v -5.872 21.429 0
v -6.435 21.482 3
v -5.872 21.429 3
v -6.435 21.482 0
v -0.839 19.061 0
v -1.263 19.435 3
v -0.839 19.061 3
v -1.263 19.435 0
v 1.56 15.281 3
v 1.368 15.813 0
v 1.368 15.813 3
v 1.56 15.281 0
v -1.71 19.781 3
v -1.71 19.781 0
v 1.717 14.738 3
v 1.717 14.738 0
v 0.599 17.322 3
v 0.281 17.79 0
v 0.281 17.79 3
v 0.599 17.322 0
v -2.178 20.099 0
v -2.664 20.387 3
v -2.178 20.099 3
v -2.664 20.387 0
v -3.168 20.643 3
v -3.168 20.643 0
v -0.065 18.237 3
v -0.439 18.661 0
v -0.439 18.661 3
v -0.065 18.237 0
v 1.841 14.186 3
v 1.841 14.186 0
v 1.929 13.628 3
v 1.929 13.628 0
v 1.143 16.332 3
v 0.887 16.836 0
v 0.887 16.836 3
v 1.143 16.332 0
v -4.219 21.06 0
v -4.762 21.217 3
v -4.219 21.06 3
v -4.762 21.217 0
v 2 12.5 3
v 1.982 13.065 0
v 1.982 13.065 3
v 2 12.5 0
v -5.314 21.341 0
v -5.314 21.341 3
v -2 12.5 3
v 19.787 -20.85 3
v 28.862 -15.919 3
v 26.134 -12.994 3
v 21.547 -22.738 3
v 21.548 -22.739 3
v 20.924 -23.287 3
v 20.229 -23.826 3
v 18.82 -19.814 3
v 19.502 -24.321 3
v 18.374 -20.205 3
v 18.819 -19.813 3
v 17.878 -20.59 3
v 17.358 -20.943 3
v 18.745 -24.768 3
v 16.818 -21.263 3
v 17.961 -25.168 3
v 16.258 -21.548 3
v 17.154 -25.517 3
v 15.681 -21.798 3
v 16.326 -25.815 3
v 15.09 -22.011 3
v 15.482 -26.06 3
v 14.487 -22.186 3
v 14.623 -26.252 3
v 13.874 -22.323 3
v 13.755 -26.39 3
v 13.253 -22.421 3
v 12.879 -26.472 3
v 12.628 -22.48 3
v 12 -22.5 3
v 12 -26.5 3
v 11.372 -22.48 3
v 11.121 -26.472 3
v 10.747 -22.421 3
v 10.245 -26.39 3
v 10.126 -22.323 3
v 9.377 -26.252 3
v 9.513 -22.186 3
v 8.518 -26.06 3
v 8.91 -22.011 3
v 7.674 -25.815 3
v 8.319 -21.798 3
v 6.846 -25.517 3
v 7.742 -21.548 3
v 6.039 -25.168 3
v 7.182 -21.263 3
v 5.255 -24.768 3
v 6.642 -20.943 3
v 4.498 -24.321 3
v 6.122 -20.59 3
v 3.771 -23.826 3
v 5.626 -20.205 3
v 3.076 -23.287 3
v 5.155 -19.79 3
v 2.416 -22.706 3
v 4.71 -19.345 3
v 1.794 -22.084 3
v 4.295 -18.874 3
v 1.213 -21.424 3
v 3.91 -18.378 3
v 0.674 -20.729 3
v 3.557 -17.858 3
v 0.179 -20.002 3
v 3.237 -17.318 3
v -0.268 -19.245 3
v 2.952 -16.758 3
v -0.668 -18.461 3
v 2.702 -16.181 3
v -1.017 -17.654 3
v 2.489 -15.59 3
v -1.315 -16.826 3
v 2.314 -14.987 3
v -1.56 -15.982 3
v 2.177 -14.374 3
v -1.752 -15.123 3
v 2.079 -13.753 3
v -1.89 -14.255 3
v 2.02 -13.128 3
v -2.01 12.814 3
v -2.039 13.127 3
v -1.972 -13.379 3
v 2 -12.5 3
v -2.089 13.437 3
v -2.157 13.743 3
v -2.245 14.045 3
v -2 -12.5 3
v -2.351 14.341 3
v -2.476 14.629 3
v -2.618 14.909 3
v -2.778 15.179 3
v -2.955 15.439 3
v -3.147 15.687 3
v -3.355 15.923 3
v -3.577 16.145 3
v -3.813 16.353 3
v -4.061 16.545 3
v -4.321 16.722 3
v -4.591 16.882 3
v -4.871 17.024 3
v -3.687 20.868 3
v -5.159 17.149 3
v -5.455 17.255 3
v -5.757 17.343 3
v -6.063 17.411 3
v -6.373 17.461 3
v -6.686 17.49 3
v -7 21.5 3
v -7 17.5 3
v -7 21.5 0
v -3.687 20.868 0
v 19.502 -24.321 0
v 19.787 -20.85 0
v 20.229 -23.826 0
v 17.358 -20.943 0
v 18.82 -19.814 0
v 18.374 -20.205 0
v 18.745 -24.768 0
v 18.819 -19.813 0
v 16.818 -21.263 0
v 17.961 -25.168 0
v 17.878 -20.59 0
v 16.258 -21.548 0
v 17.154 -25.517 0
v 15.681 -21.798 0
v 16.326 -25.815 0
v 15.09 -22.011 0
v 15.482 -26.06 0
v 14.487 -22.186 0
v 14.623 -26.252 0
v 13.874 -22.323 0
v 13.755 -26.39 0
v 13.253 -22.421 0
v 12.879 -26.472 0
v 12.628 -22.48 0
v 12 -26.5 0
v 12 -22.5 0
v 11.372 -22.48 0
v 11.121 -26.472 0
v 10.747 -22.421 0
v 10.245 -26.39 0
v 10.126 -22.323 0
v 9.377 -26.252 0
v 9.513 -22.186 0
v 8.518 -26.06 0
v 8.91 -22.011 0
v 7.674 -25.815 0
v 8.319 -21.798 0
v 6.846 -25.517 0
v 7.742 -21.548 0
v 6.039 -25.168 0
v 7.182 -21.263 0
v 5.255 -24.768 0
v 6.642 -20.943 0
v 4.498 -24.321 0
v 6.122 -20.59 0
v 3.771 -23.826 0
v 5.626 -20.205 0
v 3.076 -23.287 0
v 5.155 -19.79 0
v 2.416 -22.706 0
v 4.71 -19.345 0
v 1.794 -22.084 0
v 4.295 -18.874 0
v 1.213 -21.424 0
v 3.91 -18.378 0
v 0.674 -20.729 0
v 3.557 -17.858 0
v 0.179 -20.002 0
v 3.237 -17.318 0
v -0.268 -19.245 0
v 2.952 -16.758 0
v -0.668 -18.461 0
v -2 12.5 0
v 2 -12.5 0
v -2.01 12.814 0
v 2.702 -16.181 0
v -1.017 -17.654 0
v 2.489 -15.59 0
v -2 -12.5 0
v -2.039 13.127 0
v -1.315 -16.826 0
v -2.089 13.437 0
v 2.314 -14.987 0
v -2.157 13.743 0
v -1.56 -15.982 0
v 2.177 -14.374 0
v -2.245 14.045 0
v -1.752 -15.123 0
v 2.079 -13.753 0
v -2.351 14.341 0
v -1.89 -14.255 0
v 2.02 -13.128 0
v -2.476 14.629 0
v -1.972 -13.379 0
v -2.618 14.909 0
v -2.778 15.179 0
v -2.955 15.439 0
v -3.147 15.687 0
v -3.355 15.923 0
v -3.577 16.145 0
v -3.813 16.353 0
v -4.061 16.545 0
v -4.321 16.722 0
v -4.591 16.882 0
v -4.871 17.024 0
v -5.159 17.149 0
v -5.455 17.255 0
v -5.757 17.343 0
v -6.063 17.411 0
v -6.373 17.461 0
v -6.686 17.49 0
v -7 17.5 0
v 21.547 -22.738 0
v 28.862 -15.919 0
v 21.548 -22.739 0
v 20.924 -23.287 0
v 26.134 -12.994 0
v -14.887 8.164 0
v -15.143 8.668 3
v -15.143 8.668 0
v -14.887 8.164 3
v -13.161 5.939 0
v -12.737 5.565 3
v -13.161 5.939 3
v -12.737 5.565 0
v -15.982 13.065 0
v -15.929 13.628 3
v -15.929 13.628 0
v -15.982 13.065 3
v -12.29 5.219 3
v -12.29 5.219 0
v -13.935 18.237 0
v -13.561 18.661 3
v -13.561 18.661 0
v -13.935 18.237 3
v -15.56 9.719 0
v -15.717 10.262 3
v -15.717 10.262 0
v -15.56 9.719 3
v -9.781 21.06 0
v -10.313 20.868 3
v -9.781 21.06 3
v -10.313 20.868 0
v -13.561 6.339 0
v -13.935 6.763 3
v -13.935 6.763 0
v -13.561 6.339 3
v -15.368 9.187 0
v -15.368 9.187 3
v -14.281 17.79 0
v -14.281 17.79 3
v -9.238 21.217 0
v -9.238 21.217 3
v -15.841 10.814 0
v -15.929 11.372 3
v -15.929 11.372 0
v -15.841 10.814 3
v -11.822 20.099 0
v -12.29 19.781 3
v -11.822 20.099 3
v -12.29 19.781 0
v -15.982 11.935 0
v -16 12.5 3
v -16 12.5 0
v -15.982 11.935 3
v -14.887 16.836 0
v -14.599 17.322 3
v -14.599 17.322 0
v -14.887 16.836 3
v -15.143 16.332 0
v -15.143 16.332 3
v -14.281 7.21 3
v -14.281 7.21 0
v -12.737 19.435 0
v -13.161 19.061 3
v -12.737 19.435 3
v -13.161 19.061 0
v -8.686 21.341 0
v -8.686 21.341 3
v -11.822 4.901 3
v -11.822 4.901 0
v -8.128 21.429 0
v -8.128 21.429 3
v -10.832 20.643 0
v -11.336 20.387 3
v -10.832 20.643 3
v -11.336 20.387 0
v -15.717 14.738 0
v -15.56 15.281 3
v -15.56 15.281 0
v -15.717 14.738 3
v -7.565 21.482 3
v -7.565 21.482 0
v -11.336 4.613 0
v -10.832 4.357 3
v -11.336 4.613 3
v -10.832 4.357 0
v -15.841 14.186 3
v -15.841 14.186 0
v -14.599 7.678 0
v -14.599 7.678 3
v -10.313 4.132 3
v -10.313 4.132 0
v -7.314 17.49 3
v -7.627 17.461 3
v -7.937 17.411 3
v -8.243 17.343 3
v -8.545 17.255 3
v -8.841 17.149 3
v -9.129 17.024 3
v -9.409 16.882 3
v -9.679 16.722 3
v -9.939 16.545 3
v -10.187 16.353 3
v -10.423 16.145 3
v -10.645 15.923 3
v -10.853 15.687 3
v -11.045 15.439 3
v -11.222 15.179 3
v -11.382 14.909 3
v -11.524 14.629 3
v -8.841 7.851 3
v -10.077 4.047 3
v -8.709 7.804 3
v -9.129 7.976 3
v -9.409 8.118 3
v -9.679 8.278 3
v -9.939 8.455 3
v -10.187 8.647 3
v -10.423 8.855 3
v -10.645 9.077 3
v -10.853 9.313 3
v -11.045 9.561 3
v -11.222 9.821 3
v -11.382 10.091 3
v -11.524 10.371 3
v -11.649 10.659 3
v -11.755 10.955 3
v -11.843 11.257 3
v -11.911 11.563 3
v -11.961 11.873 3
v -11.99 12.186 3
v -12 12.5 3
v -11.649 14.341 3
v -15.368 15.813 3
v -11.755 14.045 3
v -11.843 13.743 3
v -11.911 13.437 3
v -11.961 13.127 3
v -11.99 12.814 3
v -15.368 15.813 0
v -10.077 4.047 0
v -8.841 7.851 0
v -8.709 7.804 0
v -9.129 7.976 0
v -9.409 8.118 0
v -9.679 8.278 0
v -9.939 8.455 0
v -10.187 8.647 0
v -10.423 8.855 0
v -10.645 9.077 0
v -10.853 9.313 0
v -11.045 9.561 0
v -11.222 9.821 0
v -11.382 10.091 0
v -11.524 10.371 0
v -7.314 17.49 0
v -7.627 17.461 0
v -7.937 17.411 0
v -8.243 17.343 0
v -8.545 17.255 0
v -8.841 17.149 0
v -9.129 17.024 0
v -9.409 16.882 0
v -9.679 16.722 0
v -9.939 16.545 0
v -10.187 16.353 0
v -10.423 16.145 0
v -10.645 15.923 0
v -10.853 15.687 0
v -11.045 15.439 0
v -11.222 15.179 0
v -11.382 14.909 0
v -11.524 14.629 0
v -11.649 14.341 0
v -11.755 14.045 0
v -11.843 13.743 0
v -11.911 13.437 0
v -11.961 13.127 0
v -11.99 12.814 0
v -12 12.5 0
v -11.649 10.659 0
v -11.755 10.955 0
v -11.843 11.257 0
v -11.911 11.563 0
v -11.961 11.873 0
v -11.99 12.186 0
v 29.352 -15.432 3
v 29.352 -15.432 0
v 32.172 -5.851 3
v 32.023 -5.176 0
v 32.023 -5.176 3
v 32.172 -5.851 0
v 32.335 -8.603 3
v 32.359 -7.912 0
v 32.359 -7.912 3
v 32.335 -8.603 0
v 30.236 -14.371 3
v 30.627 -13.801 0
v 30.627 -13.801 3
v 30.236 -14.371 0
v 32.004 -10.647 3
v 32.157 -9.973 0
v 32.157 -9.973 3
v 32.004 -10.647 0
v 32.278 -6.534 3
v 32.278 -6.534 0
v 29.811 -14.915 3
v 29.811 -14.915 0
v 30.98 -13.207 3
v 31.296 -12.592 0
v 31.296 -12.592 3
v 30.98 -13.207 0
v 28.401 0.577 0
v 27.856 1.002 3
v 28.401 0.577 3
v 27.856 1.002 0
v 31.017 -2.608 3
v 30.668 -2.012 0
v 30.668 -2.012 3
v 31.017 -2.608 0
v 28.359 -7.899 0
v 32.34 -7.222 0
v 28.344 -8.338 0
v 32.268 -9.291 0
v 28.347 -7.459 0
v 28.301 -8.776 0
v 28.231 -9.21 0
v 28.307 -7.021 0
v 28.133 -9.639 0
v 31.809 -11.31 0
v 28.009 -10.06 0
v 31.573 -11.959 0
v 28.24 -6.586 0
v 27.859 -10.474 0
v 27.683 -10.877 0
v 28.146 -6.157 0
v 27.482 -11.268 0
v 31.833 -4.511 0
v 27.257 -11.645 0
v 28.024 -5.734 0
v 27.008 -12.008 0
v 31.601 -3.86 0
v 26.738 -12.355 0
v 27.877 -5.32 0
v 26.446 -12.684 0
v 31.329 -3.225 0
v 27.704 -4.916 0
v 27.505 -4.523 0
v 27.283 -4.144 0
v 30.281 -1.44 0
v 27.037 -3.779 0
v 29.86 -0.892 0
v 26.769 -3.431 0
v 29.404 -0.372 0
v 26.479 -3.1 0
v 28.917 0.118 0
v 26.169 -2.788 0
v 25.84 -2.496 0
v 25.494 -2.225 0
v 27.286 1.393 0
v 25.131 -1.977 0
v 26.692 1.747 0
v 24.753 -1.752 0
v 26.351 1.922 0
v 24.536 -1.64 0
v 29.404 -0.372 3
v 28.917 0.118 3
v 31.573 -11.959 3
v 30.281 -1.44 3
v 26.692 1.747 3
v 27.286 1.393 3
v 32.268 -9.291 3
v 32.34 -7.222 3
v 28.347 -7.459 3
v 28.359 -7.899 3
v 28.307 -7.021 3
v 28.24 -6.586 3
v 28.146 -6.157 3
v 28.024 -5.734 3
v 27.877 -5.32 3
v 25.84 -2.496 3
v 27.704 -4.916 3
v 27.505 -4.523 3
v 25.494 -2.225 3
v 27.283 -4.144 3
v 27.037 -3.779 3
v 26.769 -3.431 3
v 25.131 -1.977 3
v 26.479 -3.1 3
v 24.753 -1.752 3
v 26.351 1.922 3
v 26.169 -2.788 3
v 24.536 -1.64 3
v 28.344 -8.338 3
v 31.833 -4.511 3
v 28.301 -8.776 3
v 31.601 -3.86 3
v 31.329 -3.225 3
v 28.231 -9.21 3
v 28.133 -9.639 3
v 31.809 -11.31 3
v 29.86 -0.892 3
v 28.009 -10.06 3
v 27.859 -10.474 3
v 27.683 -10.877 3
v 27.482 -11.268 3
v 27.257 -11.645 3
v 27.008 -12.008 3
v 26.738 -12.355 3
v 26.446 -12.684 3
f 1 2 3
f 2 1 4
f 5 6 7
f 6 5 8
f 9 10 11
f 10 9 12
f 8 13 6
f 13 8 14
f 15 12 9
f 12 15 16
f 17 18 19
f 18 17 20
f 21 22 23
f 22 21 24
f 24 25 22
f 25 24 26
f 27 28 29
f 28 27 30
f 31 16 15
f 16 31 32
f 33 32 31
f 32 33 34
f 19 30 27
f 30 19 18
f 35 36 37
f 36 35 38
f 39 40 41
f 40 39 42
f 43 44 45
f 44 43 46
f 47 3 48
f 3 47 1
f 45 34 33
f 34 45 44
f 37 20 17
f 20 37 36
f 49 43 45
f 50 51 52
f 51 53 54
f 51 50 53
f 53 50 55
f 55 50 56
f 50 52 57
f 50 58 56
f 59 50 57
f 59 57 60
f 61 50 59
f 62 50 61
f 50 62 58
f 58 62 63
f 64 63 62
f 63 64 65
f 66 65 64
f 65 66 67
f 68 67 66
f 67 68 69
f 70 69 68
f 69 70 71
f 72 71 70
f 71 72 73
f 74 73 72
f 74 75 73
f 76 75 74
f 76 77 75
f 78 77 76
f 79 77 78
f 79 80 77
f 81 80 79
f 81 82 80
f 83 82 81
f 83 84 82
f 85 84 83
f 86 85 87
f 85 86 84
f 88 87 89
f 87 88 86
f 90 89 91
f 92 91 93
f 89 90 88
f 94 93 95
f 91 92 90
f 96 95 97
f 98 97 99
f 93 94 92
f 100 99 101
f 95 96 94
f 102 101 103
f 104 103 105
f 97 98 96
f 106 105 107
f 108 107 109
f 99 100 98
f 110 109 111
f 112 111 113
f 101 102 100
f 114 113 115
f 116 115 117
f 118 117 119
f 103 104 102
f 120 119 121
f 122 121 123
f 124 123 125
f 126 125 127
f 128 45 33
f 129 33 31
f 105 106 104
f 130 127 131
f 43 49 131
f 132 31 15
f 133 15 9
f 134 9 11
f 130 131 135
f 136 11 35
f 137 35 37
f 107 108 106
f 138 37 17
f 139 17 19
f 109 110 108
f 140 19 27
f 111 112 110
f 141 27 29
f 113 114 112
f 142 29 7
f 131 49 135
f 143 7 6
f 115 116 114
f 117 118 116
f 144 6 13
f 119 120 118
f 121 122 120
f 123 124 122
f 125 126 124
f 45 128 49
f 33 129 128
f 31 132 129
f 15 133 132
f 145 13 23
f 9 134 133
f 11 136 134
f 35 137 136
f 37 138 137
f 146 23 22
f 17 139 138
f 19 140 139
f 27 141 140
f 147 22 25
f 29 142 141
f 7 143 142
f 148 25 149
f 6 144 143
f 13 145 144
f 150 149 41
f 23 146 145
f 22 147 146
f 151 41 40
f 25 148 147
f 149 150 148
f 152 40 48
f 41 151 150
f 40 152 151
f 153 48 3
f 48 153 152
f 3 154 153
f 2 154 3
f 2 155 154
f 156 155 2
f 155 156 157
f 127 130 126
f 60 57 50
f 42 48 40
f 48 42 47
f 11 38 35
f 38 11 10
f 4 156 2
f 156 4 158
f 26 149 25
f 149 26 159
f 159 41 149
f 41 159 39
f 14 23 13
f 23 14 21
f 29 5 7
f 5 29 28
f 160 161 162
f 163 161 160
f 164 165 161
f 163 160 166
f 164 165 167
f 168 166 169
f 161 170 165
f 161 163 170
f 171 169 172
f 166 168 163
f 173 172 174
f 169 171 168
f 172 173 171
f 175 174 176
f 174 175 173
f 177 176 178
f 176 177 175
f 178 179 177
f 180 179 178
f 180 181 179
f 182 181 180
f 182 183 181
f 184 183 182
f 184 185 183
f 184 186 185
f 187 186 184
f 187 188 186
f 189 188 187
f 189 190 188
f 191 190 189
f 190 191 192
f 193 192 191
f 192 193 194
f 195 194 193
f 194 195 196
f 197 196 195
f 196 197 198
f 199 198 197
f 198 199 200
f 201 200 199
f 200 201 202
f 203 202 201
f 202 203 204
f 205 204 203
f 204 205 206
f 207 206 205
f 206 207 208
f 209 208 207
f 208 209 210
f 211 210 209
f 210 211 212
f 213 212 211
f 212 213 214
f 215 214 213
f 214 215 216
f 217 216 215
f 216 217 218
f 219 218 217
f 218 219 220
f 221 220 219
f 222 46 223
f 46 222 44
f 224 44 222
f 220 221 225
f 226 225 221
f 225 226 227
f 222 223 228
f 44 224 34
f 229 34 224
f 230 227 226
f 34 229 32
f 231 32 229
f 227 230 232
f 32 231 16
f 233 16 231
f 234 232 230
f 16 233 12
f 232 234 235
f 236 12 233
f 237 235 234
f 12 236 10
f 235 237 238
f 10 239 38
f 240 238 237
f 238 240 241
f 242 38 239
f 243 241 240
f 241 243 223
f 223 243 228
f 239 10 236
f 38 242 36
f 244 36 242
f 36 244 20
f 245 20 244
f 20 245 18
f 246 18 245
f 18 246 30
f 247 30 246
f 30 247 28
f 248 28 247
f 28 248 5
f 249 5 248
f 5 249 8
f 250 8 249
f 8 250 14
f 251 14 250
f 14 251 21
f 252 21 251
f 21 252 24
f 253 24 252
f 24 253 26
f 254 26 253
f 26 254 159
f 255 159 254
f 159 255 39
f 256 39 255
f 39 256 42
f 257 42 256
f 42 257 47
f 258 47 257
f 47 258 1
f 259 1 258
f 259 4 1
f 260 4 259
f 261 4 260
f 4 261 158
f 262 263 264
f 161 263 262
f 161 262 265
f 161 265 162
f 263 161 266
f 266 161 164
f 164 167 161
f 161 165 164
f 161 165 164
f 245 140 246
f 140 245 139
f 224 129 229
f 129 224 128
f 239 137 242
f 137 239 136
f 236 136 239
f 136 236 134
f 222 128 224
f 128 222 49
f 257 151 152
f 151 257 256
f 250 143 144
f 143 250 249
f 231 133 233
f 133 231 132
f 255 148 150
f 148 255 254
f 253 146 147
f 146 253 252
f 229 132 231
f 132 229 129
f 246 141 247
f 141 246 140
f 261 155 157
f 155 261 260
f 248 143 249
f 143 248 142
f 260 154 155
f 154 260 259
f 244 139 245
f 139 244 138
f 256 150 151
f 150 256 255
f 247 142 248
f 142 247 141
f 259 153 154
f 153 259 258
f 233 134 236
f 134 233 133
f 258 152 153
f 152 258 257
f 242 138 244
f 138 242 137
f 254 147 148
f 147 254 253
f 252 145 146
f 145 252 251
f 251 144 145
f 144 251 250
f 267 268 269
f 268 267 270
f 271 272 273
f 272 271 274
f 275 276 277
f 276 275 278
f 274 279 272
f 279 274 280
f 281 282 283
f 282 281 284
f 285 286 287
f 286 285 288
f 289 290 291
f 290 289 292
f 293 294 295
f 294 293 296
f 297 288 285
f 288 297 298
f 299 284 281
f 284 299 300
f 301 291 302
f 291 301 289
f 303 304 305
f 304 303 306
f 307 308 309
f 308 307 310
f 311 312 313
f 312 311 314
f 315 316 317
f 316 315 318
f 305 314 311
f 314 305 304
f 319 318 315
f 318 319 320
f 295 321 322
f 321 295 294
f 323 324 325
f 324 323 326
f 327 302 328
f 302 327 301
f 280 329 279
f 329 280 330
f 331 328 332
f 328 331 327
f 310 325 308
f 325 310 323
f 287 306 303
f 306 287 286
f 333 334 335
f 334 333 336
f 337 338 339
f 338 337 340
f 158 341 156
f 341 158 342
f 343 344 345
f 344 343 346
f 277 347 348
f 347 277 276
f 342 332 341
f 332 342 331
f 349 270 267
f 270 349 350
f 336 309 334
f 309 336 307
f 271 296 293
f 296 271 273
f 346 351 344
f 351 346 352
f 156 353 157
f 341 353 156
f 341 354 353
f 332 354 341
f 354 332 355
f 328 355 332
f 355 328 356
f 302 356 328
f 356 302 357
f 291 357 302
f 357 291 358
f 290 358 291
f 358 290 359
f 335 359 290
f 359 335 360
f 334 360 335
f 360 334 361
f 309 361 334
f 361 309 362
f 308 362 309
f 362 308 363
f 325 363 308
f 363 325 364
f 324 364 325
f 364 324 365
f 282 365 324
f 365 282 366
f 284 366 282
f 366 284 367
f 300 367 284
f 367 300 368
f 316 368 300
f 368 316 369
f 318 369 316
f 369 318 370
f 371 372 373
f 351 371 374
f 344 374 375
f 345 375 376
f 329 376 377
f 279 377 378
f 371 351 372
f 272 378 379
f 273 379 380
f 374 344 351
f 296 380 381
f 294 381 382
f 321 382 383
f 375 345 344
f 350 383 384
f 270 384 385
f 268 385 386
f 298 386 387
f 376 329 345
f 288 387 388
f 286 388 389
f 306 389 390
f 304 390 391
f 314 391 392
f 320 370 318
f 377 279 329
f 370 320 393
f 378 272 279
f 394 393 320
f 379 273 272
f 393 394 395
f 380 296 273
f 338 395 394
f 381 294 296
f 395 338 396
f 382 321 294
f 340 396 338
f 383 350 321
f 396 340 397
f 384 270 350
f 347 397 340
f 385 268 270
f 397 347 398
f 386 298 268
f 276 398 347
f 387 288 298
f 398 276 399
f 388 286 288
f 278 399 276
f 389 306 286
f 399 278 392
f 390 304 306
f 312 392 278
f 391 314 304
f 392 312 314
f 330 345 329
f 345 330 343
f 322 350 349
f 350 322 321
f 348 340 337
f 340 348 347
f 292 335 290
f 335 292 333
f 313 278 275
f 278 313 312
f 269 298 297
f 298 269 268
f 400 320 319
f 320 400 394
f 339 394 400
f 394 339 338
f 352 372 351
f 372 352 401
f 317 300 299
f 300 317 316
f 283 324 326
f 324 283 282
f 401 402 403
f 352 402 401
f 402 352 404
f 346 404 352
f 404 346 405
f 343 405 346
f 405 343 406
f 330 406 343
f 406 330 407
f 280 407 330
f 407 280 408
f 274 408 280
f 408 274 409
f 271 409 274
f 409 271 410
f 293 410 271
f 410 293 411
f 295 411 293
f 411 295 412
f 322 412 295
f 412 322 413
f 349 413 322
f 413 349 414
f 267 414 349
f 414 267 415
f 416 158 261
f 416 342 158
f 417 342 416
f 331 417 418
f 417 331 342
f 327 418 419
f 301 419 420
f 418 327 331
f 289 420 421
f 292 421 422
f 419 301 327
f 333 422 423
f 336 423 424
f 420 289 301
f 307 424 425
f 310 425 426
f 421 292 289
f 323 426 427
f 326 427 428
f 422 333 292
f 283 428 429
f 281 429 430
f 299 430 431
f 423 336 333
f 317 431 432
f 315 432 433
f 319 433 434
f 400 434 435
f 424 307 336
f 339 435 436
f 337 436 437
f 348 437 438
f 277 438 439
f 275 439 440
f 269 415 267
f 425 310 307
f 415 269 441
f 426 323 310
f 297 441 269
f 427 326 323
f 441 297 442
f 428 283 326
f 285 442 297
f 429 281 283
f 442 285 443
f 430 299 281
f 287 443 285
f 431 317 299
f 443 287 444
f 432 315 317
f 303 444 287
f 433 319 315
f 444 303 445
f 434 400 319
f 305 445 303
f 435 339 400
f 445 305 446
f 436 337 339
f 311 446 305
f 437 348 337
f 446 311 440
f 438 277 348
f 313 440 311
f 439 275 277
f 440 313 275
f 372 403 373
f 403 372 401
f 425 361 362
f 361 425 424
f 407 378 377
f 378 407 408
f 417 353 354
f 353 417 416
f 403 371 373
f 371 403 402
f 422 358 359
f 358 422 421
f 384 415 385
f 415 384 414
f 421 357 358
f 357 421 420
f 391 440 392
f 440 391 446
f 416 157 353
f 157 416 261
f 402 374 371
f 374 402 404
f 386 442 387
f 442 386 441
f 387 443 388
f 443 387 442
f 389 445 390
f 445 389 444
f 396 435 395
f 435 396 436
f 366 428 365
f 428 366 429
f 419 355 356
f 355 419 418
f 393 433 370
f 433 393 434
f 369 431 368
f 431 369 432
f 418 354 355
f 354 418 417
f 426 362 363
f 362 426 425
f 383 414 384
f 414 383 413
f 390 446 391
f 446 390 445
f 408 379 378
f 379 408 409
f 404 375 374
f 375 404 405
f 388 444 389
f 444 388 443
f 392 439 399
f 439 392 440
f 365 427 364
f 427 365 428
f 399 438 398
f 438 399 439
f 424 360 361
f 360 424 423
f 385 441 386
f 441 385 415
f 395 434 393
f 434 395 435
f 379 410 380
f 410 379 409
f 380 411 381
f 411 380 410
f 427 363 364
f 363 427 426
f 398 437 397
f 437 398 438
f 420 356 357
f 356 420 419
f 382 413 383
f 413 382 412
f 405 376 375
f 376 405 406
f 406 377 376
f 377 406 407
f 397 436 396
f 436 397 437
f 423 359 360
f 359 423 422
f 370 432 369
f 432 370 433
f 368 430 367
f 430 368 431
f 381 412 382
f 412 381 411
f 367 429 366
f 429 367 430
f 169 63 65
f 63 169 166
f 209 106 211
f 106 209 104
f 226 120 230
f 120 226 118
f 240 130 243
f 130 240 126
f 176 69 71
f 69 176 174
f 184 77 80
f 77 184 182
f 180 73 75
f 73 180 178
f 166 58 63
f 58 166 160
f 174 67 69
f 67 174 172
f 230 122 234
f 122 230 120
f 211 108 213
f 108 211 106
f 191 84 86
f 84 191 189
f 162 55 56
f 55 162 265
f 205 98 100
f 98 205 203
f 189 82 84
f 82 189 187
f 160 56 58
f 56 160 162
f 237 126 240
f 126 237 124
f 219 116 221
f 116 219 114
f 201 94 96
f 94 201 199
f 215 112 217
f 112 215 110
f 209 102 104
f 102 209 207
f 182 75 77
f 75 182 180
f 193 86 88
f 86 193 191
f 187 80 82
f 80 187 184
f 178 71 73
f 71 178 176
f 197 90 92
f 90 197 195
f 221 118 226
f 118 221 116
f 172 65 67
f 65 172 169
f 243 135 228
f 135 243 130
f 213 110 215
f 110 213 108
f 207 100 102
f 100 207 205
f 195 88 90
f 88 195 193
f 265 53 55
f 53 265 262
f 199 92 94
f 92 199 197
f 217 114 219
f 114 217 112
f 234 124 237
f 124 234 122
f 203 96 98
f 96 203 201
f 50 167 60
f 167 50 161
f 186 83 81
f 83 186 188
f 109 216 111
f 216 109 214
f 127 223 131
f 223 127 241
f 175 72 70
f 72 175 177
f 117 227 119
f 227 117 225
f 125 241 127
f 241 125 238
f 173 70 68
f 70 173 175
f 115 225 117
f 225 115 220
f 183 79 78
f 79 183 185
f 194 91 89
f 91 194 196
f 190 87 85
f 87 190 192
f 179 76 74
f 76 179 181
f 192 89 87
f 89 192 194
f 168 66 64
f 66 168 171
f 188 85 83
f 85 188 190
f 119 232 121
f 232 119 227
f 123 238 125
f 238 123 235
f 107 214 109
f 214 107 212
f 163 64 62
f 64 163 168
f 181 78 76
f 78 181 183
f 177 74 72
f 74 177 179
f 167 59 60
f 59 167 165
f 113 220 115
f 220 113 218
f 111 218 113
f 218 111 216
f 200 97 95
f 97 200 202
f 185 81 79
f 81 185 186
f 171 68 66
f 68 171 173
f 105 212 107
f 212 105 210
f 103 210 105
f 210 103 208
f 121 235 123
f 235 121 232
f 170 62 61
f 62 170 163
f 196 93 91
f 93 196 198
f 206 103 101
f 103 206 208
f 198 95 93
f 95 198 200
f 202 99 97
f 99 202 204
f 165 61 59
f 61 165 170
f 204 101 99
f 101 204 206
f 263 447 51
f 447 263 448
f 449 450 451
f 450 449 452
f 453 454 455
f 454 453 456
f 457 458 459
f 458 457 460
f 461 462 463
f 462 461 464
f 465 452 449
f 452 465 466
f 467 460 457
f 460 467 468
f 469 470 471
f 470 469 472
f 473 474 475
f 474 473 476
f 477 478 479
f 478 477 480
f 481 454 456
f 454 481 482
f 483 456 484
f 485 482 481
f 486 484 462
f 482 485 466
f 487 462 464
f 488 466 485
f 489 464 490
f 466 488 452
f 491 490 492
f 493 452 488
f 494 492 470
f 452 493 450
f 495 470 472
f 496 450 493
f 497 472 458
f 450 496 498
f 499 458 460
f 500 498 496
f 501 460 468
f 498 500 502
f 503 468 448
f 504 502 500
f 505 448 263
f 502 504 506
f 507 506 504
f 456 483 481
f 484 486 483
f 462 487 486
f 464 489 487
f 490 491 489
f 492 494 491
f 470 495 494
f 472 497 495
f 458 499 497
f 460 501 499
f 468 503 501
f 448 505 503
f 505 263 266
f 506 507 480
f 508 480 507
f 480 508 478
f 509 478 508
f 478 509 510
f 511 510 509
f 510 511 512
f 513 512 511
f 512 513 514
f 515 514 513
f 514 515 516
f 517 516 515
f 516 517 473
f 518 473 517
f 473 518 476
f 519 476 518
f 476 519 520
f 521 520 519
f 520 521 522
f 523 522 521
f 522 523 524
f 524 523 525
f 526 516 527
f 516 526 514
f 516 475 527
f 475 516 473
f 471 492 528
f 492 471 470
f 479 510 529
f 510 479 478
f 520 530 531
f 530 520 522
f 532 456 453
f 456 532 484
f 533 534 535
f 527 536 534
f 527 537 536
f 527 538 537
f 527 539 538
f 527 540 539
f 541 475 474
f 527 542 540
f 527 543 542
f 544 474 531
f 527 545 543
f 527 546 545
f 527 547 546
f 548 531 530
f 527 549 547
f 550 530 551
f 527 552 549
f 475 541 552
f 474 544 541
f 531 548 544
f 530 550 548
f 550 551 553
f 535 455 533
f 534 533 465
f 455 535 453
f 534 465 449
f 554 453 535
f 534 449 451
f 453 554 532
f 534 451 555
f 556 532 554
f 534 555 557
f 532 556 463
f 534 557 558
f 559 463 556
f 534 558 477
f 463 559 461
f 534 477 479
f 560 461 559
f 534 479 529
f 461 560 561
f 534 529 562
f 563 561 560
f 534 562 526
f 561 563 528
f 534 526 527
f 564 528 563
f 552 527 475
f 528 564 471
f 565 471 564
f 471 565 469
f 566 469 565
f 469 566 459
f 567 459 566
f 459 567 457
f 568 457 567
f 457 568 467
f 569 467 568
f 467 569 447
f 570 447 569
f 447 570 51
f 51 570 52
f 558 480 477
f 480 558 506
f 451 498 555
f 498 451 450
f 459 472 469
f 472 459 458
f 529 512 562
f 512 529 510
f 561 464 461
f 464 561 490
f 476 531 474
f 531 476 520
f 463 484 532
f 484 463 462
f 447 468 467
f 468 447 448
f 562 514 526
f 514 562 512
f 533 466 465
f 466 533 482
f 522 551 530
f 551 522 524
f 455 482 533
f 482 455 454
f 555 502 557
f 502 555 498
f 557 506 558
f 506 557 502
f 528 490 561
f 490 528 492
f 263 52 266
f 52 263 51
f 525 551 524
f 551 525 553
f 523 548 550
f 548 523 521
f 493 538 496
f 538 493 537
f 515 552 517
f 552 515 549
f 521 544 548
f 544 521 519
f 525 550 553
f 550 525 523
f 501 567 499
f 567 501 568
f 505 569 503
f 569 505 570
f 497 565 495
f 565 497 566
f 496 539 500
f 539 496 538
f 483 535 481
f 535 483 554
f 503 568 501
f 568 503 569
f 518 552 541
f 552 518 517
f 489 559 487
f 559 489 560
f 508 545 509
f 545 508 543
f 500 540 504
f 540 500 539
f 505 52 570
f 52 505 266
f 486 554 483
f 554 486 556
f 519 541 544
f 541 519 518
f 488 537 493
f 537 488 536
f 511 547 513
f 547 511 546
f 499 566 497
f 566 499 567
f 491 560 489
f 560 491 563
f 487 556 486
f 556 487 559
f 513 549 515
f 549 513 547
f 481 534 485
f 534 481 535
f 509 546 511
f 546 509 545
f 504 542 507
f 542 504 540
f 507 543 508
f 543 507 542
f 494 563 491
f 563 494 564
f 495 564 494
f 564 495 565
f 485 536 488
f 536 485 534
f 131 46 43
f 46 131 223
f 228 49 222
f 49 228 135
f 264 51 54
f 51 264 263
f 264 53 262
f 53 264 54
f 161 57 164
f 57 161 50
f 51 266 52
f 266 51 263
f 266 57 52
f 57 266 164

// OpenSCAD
//Title: Universal Hook
//Author: Kevin Lin
//Date: 2016-9-18
//License: Creative Commons - Share Alike - Attribution

//Usage: Alter parameters based on measurement of items. Hook is divided into 3 sections: top, center, bottom. Top and bottom both include 2 curved sections (inner and outer), which have variables responsible for altering angle and radius of the curve. Credits to Alex English for his Wedge module.

//Number of facets used to generate an arc
$fn = 100;

//////////////////////////////////PARAMETERS/////////////////////////////////////

//GLOBAL

//Global Extrusion height
hook_thickness = 3;
//Global Hook Width
hook_width = 4;

//TOP

//top inner curve radius
top_inner_radius = 5;
//top inner curve angle
top_inner_angle = 90;

//top outer curve radius
top_outer_radius = 5;
//top outer curve angle
top_outer_angle = 160;

//top bar length
top_length = 0;


//CENTER

//center bar length
center_length = 25;


//BOTTOM

//bottom inner curve radius
bottom_inner_radius = 10;
//bottom inner curve angle
bottom_inner_angle = 133;

//bottom outer curve radius
bottom_outer_radius = 7;
//bottom outer curve angle
bottom_outer_angle = 110;

//bottom bar length
bottom_length = 10;


//////////////////////Wedge Module from Alex English/////////////////////////////

//Title: Wedge Module
//Author: Alex English - ProtoParadigm
//Date: 1/4/2013
//License: Creative Commons - Share Alike - Attribution

//Usage: Include in your other .scad projects and call wedge with arguments for the height of the wedge, the radius of the wedge, and the angle of the wedge in degrees.  The resulting wedge will be placed with the point at the origin, extending into the z axis, with the angle starting at the x axis and extending counter-clockwise as per the right-hand rule.

//Updated: 1/12/2013 - Increased dimensions of wedge to be revoved when angle is more than 180 as per suggestion from kitwallace.

module wedge_180(h, r, d)
{
	rotate(d) difference()
	{
		rotate(180-d) difference()
		{
			cylinder(h = h, r = r);
			translate([-(r+1), 0, -1]) cube([r*2+2, r+1, h+2]);
		}
		translate([-(r+1), 0, -1]) cube([r*2+2, r+1, h+2]);
	}
}

module wedge(h, r, d)
{
	if(d <= 180)
		wedge_180(h, r, d);
	else
		rotate(d) difference()
		{
			cylinder(h = h, r = r);
			translate([0, 0, -1]) wedge_180(h+2, r+1, 360-d);
		}
}

//Example: wedge(10, 20, 145); //would create a wedge 10 high, with a radius of 20, and an angle of 33 degrees.


///////////////////////////////////////////////////////////////////////////////////


module curved_section(thickness, width, radius, angle) {
    translate([-radius-width/2,0,0])
    difference() {
        wedge(thickness,radius+width,angle);
        translate([0,0,0])wedge(thickness,radius,angle);
    }
}


//Top inner curve
rotate([0,0,0]) translate([0,center_length/2])
curved_section(hook_thickness,hook_width,top_inner_radius,top_inner_angle);

//Top bar
translate([-top_inner_radius-hook_width/2-sin(top_inner_angle-90)*top_inner_radius,center_length/2+sin(top_inner_angle)*top_inner_radius,0]) rotate([0,0,top_inner_angle])
cube([hook_width,top_length,hook_thickness]);


//Top outer curve
translate([-top_inner_radius-hook_width/2-sin(top_inner_angle-90)*top_inner_radius-sin(top_inner_angle)*top_length, center_length/2+sin(top_inner_angle)*top_inner_radius-sin(top_inner_angle-90)*top_length,
            0]) 

rotate([0,0,top_inner_angle]) 

translate([hook_width/2,0])
curved_section(hook_thickness,hook_width,top_outer_radius,top_outer_angle);


//Center bar
translate([0,0,hook_thickness/2])cube([hook_width,center_length,hook_thickness],center=true);


//Bottom inner curve
translate([0,-center_length/2]) rotate([0,0,180]) 
curved_section(hook_thickness,hook_width,bottom_inner_radius,bottom_inner_angle);

//Bottom bar
translate([bottom_inner_radius+hook_width/2+sin(bottom_inner_angle-90)*bottom_inner_radius,-center_length/2-sin(bottom_inner_angle)*bottom_inner_radius,0]) rotate([0,0,bottom_inner_angle]) 
translate([-hook_width,-bottom_length,0])
cube([hook_width,bottom_length,hook_thickness]);



//Bottom outer curve
translate([bottom_inner_radius+hook_width/2+sin(bottom_inner_angle-90)*bottom_inner_radius,-center_length/2-sin(bottom_inner_angle)*bottom_inner_radius,0]) rotate([0,0,bottom_inner_angle]) 
translate([-hook_width/2,-bottom_length,0])
rotate([0,0,180]) 
curved_section(hook_thickness,hook_width,bottom_outer_radius,bottom_outer_angle);
